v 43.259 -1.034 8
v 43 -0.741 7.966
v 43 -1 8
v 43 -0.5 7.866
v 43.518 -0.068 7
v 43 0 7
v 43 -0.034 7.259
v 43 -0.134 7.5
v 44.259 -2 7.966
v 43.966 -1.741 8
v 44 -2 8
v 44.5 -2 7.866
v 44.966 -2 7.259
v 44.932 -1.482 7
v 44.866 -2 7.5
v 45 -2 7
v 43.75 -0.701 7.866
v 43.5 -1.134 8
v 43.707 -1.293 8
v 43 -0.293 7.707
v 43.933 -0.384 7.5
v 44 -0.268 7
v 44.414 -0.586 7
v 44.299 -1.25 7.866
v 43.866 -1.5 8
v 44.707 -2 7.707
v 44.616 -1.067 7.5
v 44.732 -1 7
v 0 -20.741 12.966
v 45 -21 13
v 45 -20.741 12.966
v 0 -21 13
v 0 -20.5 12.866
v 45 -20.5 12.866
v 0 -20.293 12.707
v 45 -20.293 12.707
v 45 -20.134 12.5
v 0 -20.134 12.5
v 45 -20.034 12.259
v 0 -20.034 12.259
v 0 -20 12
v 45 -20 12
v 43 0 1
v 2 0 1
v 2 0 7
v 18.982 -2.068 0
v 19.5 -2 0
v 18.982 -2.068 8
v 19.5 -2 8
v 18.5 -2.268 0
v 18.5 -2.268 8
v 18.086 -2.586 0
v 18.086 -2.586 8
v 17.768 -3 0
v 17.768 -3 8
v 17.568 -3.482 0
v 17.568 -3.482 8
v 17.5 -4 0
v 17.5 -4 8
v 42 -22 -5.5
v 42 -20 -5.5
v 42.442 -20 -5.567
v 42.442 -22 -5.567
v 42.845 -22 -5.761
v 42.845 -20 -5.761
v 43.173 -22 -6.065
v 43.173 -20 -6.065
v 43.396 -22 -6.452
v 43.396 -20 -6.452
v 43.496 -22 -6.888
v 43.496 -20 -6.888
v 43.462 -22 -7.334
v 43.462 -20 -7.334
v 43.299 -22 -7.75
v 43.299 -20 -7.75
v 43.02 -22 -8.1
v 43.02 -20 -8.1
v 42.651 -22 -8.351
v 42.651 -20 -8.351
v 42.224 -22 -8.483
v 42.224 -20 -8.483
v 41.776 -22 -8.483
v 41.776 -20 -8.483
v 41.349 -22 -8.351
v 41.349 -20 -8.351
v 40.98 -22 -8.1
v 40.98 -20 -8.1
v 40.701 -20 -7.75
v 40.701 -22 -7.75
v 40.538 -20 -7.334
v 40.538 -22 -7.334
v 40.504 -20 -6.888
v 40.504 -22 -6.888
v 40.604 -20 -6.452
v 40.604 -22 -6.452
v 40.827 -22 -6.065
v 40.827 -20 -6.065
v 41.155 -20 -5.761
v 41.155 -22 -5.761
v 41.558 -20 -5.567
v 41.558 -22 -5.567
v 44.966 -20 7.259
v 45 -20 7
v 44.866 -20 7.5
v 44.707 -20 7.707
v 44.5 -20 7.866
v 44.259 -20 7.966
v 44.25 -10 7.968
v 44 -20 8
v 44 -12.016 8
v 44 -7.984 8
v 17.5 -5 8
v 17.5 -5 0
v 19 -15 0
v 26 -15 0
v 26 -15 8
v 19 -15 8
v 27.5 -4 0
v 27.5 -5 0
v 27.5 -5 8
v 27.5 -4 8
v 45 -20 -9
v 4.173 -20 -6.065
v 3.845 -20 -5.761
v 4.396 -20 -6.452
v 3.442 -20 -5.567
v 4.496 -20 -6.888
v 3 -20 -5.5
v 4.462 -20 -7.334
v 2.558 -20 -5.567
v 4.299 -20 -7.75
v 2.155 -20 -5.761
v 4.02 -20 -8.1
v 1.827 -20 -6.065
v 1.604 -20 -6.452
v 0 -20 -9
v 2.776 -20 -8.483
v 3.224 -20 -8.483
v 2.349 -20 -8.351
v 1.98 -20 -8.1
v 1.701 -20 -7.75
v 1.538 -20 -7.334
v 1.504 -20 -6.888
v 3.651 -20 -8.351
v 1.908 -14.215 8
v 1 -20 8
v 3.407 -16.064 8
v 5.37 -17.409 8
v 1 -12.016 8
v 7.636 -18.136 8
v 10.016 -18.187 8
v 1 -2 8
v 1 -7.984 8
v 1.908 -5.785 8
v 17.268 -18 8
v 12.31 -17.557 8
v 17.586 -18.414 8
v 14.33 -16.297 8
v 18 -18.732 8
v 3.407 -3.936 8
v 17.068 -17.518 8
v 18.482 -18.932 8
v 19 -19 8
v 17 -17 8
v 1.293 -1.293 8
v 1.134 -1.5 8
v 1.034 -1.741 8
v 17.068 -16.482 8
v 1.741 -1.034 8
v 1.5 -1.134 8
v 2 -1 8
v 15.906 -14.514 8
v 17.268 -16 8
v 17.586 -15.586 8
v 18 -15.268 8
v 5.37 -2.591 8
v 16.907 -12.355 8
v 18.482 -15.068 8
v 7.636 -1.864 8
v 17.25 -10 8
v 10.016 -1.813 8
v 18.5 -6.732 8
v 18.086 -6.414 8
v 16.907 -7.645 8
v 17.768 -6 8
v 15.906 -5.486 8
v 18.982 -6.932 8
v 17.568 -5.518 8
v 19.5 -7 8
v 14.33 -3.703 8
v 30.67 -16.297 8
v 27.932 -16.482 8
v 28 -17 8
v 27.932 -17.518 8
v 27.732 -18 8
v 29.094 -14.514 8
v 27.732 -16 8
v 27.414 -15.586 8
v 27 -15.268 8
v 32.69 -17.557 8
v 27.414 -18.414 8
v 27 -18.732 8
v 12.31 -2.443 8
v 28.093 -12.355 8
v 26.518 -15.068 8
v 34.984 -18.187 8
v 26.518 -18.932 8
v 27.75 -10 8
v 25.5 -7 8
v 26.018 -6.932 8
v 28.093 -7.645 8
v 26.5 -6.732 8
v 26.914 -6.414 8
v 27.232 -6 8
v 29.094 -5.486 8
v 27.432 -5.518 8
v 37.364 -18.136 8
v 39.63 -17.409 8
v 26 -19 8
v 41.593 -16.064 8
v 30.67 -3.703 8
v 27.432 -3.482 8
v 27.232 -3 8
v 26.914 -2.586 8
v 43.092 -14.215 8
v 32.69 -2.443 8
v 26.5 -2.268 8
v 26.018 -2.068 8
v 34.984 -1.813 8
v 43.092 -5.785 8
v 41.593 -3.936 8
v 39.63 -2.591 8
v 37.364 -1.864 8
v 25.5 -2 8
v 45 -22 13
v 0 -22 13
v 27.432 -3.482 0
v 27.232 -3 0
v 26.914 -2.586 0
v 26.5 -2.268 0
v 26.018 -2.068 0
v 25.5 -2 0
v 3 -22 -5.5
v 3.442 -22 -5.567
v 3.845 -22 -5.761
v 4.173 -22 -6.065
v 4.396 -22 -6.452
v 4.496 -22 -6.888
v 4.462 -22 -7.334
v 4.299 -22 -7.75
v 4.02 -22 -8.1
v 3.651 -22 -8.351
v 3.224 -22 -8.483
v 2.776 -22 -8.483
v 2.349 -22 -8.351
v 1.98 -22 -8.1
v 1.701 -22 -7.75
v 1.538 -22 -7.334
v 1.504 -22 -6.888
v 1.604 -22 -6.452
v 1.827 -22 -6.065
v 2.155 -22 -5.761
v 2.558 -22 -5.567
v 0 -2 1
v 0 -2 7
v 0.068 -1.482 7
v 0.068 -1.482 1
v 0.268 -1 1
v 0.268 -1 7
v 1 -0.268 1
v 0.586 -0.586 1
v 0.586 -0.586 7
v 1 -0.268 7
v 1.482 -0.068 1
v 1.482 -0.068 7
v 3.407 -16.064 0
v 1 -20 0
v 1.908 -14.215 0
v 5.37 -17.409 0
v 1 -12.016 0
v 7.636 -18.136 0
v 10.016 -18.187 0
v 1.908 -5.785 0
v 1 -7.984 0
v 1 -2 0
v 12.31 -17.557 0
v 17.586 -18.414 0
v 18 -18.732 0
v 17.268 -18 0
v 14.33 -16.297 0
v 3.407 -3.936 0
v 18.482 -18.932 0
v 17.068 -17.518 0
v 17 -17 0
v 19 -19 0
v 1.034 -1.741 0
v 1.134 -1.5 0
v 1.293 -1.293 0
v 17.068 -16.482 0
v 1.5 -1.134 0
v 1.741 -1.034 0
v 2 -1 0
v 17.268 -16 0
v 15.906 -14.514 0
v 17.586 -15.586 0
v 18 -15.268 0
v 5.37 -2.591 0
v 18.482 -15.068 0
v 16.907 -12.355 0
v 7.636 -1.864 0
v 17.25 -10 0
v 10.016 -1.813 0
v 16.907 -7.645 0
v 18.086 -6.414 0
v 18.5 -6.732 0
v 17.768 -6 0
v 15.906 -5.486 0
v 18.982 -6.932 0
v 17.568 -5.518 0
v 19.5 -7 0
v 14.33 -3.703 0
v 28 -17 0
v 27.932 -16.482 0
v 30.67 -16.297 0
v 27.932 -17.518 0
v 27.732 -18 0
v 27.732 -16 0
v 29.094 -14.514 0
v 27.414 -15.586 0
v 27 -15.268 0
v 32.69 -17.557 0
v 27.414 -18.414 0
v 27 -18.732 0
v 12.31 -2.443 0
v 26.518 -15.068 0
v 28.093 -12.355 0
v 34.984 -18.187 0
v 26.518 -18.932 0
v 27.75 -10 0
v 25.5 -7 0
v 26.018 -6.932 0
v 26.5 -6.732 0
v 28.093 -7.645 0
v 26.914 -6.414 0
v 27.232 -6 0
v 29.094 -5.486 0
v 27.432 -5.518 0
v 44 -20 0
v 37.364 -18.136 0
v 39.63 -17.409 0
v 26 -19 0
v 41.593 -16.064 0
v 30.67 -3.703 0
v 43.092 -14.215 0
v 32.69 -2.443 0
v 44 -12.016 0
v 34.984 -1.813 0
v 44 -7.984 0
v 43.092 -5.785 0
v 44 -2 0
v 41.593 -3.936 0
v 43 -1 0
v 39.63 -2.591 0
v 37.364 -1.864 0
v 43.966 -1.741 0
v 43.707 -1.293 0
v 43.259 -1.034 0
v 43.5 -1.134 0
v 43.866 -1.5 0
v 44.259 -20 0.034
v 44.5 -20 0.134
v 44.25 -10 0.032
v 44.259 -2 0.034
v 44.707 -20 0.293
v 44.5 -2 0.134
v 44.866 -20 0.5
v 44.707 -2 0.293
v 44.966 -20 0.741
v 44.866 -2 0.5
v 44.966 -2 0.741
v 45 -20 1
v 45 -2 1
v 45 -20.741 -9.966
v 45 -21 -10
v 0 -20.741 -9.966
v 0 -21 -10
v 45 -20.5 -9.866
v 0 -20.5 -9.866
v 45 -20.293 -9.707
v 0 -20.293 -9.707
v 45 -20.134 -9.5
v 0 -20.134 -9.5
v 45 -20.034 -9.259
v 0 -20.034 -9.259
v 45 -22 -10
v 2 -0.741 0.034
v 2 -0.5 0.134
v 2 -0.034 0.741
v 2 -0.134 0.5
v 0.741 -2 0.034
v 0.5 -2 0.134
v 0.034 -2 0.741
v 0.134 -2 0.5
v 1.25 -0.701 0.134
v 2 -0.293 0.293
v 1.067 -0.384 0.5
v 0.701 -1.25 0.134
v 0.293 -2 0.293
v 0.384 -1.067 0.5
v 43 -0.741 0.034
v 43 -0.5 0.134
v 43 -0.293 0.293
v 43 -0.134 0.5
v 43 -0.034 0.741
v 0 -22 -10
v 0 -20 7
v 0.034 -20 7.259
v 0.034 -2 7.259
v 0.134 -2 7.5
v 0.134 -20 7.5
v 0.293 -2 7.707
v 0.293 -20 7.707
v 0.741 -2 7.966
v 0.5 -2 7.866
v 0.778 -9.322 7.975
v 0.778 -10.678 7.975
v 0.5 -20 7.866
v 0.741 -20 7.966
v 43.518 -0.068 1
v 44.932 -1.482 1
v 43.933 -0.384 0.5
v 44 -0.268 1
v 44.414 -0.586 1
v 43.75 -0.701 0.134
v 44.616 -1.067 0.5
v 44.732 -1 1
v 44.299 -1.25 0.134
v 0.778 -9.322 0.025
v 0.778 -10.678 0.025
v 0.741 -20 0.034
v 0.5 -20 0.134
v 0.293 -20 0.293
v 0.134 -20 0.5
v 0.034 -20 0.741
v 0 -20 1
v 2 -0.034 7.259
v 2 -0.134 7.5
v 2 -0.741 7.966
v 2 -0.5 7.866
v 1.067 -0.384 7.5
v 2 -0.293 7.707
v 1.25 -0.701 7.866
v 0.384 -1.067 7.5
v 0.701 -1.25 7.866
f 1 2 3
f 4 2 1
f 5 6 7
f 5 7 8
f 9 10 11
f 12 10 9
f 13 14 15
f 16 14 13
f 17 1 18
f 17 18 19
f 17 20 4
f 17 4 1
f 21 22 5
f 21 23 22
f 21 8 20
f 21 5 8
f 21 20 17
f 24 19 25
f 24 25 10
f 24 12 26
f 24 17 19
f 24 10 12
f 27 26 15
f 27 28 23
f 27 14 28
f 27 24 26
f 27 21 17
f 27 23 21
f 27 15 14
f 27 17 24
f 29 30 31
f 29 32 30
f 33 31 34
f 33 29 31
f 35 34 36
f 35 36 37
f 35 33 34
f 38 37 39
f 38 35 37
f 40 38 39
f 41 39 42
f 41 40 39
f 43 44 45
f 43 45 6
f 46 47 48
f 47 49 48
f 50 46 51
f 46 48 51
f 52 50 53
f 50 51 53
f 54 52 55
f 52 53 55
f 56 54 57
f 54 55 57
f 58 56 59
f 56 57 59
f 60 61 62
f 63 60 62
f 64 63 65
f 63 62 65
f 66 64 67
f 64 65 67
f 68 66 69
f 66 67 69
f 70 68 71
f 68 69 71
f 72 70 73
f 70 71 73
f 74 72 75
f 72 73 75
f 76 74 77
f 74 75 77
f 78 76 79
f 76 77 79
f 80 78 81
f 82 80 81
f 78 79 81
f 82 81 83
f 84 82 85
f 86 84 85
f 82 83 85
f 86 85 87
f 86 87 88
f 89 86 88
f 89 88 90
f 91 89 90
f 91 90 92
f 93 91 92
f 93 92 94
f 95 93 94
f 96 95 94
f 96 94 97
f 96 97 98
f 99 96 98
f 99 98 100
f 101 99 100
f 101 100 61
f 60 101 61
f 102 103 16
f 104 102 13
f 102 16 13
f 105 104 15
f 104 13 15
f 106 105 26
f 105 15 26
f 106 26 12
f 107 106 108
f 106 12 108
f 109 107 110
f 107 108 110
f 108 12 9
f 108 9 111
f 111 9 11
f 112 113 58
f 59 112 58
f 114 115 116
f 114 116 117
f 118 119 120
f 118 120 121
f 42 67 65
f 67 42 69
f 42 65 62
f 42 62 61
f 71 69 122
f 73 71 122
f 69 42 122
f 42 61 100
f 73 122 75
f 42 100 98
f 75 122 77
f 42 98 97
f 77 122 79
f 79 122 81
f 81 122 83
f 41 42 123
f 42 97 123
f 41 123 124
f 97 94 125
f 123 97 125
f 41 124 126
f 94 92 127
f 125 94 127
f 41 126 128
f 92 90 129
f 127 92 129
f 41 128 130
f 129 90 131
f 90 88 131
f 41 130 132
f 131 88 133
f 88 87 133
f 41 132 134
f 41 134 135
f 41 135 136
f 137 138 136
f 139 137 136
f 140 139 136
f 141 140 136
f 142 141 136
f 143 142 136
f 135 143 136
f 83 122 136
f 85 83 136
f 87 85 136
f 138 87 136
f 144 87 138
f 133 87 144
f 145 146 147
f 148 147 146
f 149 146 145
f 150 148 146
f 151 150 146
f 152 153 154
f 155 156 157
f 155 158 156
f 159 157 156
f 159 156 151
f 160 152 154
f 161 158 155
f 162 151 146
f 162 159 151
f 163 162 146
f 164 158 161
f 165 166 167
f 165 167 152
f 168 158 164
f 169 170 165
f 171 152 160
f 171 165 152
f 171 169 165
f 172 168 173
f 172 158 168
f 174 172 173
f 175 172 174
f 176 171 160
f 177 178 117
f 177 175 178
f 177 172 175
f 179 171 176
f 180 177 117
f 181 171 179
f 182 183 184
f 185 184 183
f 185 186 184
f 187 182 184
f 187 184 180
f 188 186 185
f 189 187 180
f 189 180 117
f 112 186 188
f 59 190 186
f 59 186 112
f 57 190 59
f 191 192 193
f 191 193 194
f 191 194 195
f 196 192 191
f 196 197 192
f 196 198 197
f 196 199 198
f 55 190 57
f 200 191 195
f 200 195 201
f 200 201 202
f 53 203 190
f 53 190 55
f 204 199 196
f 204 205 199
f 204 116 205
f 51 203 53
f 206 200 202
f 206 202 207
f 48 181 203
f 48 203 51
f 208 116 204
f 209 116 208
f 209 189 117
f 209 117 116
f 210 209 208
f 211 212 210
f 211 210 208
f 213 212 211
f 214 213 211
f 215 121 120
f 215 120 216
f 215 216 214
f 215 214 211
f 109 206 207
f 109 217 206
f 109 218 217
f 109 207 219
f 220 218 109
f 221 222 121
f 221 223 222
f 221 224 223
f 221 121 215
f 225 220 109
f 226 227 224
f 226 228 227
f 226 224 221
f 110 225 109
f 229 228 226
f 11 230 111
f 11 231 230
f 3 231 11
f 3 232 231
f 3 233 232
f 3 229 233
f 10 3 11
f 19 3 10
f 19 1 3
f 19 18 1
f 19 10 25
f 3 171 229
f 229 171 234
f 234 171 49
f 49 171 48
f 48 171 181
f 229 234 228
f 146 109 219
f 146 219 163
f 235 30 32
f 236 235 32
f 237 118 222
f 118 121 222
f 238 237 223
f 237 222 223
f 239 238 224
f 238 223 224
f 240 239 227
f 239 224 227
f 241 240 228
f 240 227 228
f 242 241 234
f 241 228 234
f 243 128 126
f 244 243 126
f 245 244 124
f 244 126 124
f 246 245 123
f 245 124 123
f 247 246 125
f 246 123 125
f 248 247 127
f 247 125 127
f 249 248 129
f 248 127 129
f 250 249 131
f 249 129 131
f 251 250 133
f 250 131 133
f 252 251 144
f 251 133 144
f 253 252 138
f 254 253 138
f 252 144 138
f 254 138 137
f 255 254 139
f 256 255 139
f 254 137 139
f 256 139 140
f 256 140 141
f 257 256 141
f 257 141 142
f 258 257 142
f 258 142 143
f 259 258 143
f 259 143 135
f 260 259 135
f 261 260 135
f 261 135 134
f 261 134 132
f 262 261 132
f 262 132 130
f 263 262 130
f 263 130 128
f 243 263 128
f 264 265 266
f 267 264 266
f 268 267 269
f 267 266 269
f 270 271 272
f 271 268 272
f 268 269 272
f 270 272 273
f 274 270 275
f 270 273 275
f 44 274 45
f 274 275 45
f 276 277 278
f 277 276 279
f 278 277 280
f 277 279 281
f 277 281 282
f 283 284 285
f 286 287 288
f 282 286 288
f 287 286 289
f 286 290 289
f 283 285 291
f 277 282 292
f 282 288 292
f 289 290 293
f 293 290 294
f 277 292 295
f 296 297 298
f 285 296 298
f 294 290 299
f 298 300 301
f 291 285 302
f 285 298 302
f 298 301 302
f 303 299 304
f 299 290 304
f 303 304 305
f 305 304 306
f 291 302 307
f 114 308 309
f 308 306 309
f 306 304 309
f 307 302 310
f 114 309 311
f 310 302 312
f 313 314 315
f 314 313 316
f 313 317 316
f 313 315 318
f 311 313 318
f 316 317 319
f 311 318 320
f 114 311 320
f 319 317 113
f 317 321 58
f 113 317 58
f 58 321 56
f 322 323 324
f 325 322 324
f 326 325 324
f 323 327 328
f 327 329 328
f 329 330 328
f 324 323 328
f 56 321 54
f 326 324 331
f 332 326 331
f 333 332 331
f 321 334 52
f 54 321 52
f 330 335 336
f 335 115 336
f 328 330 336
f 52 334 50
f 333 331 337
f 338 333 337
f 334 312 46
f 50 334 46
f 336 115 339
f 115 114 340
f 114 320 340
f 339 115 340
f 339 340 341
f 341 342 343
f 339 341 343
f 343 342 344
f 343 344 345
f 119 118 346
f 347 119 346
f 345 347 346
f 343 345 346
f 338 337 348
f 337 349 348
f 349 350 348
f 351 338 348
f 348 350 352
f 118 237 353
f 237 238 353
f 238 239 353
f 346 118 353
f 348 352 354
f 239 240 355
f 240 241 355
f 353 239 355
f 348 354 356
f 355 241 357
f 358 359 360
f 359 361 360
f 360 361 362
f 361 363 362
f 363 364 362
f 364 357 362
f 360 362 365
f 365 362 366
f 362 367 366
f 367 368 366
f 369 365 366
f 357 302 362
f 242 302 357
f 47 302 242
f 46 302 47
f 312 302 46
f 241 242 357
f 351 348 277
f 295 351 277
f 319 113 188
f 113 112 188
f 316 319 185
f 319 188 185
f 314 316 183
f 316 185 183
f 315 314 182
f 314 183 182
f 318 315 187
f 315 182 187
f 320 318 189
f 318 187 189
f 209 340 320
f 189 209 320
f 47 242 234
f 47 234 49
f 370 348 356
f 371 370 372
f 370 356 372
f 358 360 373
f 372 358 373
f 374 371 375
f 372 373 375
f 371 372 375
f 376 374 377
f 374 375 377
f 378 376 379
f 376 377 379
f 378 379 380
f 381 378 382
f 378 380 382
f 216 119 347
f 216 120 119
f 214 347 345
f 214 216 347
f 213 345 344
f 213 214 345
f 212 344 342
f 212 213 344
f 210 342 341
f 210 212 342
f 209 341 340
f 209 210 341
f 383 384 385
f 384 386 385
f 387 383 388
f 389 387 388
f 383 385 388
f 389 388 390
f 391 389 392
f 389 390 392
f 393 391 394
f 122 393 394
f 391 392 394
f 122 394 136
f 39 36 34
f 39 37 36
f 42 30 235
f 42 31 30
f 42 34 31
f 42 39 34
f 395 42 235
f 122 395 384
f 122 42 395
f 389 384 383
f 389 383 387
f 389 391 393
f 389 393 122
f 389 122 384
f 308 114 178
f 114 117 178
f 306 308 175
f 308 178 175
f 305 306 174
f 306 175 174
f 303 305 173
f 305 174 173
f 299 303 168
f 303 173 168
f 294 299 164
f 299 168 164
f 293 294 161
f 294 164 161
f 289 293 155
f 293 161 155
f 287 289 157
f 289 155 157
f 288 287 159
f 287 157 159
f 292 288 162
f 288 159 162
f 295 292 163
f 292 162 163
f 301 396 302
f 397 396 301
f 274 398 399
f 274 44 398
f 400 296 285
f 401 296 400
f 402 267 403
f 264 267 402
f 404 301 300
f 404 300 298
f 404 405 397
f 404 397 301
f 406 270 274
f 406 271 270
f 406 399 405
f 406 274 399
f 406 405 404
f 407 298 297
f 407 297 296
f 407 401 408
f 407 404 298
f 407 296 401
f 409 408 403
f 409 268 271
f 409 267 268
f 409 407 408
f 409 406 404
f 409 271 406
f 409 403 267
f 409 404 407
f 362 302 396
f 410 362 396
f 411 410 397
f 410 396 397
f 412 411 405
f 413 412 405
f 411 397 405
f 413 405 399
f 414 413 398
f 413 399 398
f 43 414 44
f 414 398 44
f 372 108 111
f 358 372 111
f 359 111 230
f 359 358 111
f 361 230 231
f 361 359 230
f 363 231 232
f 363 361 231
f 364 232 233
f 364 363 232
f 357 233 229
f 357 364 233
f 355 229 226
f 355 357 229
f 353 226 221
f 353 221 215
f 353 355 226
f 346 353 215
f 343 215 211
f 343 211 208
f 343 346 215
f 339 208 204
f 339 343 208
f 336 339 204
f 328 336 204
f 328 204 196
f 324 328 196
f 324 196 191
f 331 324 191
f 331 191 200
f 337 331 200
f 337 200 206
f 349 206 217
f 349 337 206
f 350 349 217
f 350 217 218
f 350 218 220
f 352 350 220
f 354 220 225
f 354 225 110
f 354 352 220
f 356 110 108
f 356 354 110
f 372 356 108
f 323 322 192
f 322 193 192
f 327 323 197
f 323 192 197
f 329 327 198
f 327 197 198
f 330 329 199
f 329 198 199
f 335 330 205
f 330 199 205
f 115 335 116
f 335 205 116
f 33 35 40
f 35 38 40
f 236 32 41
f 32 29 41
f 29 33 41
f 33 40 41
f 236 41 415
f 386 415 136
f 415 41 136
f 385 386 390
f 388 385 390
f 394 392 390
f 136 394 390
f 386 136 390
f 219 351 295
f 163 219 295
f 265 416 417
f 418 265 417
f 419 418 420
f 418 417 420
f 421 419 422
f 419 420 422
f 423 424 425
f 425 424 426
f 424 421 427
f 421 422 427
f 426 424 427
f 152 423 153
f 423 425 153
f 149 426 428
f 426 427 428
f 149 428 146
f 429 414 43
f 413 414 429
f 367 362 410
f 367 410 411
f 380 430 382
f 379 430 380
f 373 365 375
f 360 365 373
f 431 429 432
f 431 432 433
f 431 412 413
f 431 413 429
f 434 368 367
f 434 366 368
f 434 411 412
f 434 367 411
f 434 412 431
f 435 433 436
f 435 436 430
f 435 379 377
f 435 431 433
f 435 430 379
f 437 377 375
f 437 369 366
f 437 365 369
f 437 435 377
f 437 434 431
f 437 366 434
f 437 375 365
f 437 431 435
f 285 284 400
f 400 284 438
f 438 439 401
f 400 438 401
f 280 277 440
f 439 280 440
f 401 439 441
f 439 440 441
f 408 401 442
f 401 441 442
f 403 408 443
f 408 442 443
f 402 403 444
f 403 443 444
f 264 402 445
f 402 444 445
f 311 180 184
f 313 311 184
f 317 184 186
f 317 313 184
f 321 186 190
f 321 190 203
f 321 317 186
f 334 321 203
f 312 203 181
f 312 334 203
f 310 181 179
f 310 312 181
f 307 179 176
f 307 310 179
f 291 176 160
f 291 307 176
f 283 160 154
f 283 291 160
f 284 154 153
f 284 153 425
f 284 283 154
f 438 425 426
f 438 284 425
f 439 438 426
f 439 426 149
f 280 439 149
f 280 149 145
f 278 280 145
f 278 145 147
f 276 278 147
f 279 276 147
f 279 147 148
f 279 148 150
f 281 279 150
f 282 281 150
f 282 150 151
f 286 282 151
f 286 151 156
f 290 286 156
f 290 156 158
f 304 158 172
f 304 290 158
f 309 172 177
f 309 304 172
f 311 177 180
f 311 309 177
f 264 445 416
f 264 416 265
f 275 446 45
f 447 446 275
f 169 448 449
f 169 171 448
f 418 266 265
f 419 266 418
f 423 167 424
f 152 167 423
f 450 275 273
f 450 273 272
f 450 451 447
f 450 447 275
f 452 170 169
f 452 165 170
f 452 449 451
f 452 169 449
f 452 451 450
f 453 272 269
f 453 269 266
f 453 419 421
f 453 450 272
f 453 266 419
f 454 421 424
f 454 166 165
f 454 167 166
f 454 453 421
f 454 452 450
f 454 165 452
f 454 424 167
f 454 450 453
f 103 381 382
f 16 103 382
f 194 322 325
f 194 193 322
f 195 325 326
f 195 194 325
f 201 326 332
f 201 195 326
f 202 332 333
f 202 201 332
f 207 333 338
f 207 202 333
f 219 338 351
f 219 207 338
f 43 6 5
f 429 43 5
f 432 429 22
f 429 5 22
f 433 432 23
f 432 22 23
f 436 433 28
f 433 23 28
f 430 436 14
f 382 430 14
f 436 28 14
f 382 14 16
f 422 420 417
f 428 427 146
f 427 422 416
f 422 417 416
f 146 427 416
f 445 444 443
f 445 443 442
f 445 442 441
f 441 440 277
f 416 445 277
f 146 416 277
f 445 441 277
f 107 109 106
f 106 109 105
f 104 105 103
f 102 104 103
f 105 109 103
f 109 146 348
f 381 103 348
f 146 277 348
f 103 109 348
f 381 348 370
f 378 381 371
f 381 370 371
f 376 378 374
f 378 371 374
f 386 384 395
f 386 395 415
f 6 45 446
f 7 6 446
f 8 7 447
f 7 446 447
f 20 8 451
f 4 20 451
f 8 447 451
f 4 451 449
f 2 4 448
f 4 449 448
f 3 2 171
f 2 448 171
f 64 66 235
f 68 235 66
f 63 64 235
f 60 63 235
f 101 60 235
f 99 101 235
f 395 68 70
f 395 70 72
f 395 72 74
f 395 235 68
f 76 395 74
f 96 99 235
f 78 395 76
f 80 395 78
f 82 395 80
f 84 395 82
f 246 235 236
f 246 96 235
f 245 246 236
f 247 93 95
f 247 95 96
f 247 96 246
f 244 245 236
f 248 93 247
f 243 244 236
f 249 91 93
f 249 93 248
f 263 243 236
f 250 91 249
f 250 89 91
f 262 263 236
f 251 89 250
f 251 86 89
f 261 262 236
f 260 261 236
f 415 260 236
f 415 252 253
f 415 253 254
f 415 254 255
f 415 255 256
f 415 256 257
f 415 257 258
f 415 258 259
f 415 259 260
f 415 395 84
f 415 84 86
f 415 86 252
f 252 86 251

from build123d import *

# Parameters (mm, degrees)
CROQUIS1_W              = 45
CROQUIS1_H              = 20
CROQUIS1_R              = 8.25
SALIENTE_EXTRUIR1_DEPTH = 8
CROQUIS2_W              = 45
CROQUIS2_H              = 23
SALIENTE_EXTRUIR2_DEPTH = 2
CROQUIS4_W              = 11
CROQUIS4_H              = 4
CROQUIS4_W_2            = 10
CROQUIS4_H_2            = 5
CORTAR_EXTRUIR3_DEPTH   = 52.749396132
CROQUIS5_R              = 1.5
CORTAR_EXTRUIR4_DEPTH   = 51.931326313
REDONDEO1_R             = 2
REDONDEO2_R             = 2
REDONDEO3_R             = 1
REDONDEO5_R             = 1


# Some blends are built 0.0001 mm under size
with BuildPart() as part:
    # Croquis1 → Saliente-Extruir1 (new body)
    with BuildSketch(Plane.XY):
        with Locations((22.5, -10)):
            Rectangle(CROQUIS1_W, CROQUIS1_H)
        with Locations((9, -10)):
            Circle(CROQUIS1_R, mode=Mode.SUBTRACT)
        with Locations((36, -10)):
            Circle(CROQUIS1_R, mode=Mode.SUBTRACT)
    extrude(amount=SALIENTE_EXTRUIR1_DEPTH)

    # Croquis4 → Cortar-Extruir3 (cut, through all)
    with BuildSketch(Plane(origin=(0, 0, 0), x_dir=(-1, 0, 0), z_dir=(0, 0, -1))):
        with Locations((-22.5, -17)):
            Rectangle(CROQUIS4_W, CROQUIS4_H)
        with Locations((-22.5, -4.5)):
            Rectangle(CROQUIS4_W_2, CROQUIS4_H_2)
    extrude(amount=-CORTAR_EXTRUIR3_DEPTH, mode=Mode.SUBTRACT)

    # Redondeo1
    redondeo1_edges = [part.edges().sort_by_distance(p)[0] for p in [
        (17, -19, 4),
        (28, -15, 4),
        (17, -15, 4),
        (28, -19, 4),
    ]]
    fillet(redondeo1_edges, radius=REDONDEO1_R - 0.0001)  # a hair under: the kernel refuses the full size

    # Redondeo2
    redondeo2_edges = [part.edges().sort_by_distance(p)[0] for p in [
        (17.5, -7, 4),
        (27.5, -7, 4),
        (27.5, -2, 4),
        (17.5, -2, 4),
        (0, 0, 4),
        (45, 0, 4),
    ]]
    fillet(redondeo2_edges, radius=REDONDEO2_R)

    # Redondeo3
    # the kernel refuses this fillet: 1 mm, written as the material it takes off along each edge
    with BuildSketch(Plane(origin=(45, -2, 8), x_dir=(0, 0, -1), z_dir=(0, -1, 0)), Plane(origin=(45, -2, 0), x_dir=(-1, 0, 0), z_dir=(0, -1, 0)), Plane(origin=(0, -22.5, 0), x_dir=(1, 0, 0), z_dir=(0, 1, 0)), Plane(origin=(0, -22.5, 8), x_dir=(0, 0, -1), z_dir=(0, 1, 0))) as redondeo3_piece_1:
        with BuildLine():
            CenterArc((REDONDEO3_R, -REDONDEO3_R), REDONDEO3_R, 90, 90)
            Line((0, -REDONDEO3_R), (0, 0))
            Line((0, 0), (REDONDEO3_R, 0))
        make_face()
    extrude(amount=20.5, mode=Mode.SUBTRACT)
    with BuildSketch(Plane(origin=(2, 0, 0), x_dir=(0, -1, 0), z_dir=(1, 0, 0)), Plane(origin=(2, 0, 8), x_dir=(0, 0, -1), z_dir=(1, 0, 0))) as redondeo3_piece_2:
        with BuildLine():
            CenterArc((REDONDEO3_R, -REDONDEO3_R), REDONDEO3_R, 90, 90)
            Line((0, -REDONDEO3_R), (0, 0))
            Line((0, 0), (REDONDEO3_R, 0))
        make_face()
    extrude(amount=41, mode=Mode.SUBTRACT)
    with BuildSketch(Plane(origin=(2, -2, 0), x_dir=(0, 1, 0), z_dir=(1, 0, 0))) as redondeo3_piece_3:
        with BuildLine():
            CenterArc((2 - REDONDEO3_R, REDONDEO3_R), REDONDEO3_R, 270, 90)
            Line((2, REDONDEO3_R), (2, 0))
            Line((2, 0), (2 - REDONDEO3_R, 0))
        make_face()
    revolve(axis=Axis((2, -2, 0), (0, 0, 1)), revolution_arc=90, mode=Mode.SUBTRACT)
    with BuildSketch(Plane(origin=(43, -2, 0), x_dir=(0, 1, 0), z_dir=(-1, 0, 0))) as redondeo3_piece_4:
        with BuildLine():
            CenterArc((2 - REDONDEO3_R, -REDONDEO3_R), REDONDEO3_R, 0, 90)
            Line((2, -REDONDEO3_R), (2, 0))
            Line((2, 0), (2 - REDONDEO3_R, 0))
        make_face()
    revolve(axis=Axis((43, -2, 0), (0, 0, -1)), revolution_arc=90, mode=Mode.SUBTRACT)
    with BuildSketch(Plane(origin=(2, -2, 8), x_dir=(0, 1, 0), z_dir=(1, 0, 0))) as redondeo3_piece_5:
        with BuildLine():
            CenterArc((2 - REDONDEO3_R, -REDONDEO3_R), REDONDEO3_R, 0, 90)
            Line((2 - REDONDEO3_R, 0), (2, 0))
            Line((2, 0), (2, -REDONDEO3_R))
        make_face()
    revolve(axis=Axis((2, -2, 8), (0, 0, 1)), revolution_arc=90, mode=Mode.SUBTRACT)
    with BuildSketch(Plane(origin=(43, -2, 8), x_dir=(0, 1, 0), z_dir=(-1, 0, 0))) as redondeo3_piece_6:
        with BuildLine():
            CenterArc((2 - REDONDEO3_R, REDONDEO3_R), REDONDEO3_R, 270, 90)
            Line((2 - REDONDEO3_R, 0), (2, 0))
            Line((2, 0), (2, REDONDEO3_R))
        make_face()
    revolve(axis=Axis((43, -2, 8), (0, 0, -1)), revolution_arc=90, mode=Mode.SUBTRACT)


with BuildPart() as body_2:
    # Croquis2 → Saliente-Extruir2 (new body)
    with BuildSketch(Plane(origin=(0, -20, 0), x_dir=(-1, 0, 0), z_dir=(0, -1, 0))):
        with Locations((-22.5, -1.5)):
            Rectangle(CROQUIS2_W, CROQUIS2_H)
    extrude(amount=SALIENTE_EXTRUIR2_DEPTH)

    # Croquis5 → Cortar-Extruir4 (cut, through all)
    with BuildSketch(Plane(origin=(0, -20, 0), x_dir=(1, 0, 0), z_dir=(0, 1, 0))):
        with Locations(Location((3, 7, 0), (0, 0, 270))):
            Circle(CROQUIS5_R)
        with Locations(Location((42, 7, 0), (0, 0, 270))):
            Circle(CROQUIS5_R)
    extrude(amount=-CORTAR_EXTRUIR4_DEPTH, mode=Mode.SUBTRACT)

    # Redondeo5
    redondeo5_edges = [body_2.edges().sort_by_distance(p)[0] for p in [
        (22.5, -20, -10),
        (22.5, -20, 13),
    ]]
    fillet(redondeo5_edges, radius=REDONDEO5_R)


solid = Compound([part.part, body_2.part])
